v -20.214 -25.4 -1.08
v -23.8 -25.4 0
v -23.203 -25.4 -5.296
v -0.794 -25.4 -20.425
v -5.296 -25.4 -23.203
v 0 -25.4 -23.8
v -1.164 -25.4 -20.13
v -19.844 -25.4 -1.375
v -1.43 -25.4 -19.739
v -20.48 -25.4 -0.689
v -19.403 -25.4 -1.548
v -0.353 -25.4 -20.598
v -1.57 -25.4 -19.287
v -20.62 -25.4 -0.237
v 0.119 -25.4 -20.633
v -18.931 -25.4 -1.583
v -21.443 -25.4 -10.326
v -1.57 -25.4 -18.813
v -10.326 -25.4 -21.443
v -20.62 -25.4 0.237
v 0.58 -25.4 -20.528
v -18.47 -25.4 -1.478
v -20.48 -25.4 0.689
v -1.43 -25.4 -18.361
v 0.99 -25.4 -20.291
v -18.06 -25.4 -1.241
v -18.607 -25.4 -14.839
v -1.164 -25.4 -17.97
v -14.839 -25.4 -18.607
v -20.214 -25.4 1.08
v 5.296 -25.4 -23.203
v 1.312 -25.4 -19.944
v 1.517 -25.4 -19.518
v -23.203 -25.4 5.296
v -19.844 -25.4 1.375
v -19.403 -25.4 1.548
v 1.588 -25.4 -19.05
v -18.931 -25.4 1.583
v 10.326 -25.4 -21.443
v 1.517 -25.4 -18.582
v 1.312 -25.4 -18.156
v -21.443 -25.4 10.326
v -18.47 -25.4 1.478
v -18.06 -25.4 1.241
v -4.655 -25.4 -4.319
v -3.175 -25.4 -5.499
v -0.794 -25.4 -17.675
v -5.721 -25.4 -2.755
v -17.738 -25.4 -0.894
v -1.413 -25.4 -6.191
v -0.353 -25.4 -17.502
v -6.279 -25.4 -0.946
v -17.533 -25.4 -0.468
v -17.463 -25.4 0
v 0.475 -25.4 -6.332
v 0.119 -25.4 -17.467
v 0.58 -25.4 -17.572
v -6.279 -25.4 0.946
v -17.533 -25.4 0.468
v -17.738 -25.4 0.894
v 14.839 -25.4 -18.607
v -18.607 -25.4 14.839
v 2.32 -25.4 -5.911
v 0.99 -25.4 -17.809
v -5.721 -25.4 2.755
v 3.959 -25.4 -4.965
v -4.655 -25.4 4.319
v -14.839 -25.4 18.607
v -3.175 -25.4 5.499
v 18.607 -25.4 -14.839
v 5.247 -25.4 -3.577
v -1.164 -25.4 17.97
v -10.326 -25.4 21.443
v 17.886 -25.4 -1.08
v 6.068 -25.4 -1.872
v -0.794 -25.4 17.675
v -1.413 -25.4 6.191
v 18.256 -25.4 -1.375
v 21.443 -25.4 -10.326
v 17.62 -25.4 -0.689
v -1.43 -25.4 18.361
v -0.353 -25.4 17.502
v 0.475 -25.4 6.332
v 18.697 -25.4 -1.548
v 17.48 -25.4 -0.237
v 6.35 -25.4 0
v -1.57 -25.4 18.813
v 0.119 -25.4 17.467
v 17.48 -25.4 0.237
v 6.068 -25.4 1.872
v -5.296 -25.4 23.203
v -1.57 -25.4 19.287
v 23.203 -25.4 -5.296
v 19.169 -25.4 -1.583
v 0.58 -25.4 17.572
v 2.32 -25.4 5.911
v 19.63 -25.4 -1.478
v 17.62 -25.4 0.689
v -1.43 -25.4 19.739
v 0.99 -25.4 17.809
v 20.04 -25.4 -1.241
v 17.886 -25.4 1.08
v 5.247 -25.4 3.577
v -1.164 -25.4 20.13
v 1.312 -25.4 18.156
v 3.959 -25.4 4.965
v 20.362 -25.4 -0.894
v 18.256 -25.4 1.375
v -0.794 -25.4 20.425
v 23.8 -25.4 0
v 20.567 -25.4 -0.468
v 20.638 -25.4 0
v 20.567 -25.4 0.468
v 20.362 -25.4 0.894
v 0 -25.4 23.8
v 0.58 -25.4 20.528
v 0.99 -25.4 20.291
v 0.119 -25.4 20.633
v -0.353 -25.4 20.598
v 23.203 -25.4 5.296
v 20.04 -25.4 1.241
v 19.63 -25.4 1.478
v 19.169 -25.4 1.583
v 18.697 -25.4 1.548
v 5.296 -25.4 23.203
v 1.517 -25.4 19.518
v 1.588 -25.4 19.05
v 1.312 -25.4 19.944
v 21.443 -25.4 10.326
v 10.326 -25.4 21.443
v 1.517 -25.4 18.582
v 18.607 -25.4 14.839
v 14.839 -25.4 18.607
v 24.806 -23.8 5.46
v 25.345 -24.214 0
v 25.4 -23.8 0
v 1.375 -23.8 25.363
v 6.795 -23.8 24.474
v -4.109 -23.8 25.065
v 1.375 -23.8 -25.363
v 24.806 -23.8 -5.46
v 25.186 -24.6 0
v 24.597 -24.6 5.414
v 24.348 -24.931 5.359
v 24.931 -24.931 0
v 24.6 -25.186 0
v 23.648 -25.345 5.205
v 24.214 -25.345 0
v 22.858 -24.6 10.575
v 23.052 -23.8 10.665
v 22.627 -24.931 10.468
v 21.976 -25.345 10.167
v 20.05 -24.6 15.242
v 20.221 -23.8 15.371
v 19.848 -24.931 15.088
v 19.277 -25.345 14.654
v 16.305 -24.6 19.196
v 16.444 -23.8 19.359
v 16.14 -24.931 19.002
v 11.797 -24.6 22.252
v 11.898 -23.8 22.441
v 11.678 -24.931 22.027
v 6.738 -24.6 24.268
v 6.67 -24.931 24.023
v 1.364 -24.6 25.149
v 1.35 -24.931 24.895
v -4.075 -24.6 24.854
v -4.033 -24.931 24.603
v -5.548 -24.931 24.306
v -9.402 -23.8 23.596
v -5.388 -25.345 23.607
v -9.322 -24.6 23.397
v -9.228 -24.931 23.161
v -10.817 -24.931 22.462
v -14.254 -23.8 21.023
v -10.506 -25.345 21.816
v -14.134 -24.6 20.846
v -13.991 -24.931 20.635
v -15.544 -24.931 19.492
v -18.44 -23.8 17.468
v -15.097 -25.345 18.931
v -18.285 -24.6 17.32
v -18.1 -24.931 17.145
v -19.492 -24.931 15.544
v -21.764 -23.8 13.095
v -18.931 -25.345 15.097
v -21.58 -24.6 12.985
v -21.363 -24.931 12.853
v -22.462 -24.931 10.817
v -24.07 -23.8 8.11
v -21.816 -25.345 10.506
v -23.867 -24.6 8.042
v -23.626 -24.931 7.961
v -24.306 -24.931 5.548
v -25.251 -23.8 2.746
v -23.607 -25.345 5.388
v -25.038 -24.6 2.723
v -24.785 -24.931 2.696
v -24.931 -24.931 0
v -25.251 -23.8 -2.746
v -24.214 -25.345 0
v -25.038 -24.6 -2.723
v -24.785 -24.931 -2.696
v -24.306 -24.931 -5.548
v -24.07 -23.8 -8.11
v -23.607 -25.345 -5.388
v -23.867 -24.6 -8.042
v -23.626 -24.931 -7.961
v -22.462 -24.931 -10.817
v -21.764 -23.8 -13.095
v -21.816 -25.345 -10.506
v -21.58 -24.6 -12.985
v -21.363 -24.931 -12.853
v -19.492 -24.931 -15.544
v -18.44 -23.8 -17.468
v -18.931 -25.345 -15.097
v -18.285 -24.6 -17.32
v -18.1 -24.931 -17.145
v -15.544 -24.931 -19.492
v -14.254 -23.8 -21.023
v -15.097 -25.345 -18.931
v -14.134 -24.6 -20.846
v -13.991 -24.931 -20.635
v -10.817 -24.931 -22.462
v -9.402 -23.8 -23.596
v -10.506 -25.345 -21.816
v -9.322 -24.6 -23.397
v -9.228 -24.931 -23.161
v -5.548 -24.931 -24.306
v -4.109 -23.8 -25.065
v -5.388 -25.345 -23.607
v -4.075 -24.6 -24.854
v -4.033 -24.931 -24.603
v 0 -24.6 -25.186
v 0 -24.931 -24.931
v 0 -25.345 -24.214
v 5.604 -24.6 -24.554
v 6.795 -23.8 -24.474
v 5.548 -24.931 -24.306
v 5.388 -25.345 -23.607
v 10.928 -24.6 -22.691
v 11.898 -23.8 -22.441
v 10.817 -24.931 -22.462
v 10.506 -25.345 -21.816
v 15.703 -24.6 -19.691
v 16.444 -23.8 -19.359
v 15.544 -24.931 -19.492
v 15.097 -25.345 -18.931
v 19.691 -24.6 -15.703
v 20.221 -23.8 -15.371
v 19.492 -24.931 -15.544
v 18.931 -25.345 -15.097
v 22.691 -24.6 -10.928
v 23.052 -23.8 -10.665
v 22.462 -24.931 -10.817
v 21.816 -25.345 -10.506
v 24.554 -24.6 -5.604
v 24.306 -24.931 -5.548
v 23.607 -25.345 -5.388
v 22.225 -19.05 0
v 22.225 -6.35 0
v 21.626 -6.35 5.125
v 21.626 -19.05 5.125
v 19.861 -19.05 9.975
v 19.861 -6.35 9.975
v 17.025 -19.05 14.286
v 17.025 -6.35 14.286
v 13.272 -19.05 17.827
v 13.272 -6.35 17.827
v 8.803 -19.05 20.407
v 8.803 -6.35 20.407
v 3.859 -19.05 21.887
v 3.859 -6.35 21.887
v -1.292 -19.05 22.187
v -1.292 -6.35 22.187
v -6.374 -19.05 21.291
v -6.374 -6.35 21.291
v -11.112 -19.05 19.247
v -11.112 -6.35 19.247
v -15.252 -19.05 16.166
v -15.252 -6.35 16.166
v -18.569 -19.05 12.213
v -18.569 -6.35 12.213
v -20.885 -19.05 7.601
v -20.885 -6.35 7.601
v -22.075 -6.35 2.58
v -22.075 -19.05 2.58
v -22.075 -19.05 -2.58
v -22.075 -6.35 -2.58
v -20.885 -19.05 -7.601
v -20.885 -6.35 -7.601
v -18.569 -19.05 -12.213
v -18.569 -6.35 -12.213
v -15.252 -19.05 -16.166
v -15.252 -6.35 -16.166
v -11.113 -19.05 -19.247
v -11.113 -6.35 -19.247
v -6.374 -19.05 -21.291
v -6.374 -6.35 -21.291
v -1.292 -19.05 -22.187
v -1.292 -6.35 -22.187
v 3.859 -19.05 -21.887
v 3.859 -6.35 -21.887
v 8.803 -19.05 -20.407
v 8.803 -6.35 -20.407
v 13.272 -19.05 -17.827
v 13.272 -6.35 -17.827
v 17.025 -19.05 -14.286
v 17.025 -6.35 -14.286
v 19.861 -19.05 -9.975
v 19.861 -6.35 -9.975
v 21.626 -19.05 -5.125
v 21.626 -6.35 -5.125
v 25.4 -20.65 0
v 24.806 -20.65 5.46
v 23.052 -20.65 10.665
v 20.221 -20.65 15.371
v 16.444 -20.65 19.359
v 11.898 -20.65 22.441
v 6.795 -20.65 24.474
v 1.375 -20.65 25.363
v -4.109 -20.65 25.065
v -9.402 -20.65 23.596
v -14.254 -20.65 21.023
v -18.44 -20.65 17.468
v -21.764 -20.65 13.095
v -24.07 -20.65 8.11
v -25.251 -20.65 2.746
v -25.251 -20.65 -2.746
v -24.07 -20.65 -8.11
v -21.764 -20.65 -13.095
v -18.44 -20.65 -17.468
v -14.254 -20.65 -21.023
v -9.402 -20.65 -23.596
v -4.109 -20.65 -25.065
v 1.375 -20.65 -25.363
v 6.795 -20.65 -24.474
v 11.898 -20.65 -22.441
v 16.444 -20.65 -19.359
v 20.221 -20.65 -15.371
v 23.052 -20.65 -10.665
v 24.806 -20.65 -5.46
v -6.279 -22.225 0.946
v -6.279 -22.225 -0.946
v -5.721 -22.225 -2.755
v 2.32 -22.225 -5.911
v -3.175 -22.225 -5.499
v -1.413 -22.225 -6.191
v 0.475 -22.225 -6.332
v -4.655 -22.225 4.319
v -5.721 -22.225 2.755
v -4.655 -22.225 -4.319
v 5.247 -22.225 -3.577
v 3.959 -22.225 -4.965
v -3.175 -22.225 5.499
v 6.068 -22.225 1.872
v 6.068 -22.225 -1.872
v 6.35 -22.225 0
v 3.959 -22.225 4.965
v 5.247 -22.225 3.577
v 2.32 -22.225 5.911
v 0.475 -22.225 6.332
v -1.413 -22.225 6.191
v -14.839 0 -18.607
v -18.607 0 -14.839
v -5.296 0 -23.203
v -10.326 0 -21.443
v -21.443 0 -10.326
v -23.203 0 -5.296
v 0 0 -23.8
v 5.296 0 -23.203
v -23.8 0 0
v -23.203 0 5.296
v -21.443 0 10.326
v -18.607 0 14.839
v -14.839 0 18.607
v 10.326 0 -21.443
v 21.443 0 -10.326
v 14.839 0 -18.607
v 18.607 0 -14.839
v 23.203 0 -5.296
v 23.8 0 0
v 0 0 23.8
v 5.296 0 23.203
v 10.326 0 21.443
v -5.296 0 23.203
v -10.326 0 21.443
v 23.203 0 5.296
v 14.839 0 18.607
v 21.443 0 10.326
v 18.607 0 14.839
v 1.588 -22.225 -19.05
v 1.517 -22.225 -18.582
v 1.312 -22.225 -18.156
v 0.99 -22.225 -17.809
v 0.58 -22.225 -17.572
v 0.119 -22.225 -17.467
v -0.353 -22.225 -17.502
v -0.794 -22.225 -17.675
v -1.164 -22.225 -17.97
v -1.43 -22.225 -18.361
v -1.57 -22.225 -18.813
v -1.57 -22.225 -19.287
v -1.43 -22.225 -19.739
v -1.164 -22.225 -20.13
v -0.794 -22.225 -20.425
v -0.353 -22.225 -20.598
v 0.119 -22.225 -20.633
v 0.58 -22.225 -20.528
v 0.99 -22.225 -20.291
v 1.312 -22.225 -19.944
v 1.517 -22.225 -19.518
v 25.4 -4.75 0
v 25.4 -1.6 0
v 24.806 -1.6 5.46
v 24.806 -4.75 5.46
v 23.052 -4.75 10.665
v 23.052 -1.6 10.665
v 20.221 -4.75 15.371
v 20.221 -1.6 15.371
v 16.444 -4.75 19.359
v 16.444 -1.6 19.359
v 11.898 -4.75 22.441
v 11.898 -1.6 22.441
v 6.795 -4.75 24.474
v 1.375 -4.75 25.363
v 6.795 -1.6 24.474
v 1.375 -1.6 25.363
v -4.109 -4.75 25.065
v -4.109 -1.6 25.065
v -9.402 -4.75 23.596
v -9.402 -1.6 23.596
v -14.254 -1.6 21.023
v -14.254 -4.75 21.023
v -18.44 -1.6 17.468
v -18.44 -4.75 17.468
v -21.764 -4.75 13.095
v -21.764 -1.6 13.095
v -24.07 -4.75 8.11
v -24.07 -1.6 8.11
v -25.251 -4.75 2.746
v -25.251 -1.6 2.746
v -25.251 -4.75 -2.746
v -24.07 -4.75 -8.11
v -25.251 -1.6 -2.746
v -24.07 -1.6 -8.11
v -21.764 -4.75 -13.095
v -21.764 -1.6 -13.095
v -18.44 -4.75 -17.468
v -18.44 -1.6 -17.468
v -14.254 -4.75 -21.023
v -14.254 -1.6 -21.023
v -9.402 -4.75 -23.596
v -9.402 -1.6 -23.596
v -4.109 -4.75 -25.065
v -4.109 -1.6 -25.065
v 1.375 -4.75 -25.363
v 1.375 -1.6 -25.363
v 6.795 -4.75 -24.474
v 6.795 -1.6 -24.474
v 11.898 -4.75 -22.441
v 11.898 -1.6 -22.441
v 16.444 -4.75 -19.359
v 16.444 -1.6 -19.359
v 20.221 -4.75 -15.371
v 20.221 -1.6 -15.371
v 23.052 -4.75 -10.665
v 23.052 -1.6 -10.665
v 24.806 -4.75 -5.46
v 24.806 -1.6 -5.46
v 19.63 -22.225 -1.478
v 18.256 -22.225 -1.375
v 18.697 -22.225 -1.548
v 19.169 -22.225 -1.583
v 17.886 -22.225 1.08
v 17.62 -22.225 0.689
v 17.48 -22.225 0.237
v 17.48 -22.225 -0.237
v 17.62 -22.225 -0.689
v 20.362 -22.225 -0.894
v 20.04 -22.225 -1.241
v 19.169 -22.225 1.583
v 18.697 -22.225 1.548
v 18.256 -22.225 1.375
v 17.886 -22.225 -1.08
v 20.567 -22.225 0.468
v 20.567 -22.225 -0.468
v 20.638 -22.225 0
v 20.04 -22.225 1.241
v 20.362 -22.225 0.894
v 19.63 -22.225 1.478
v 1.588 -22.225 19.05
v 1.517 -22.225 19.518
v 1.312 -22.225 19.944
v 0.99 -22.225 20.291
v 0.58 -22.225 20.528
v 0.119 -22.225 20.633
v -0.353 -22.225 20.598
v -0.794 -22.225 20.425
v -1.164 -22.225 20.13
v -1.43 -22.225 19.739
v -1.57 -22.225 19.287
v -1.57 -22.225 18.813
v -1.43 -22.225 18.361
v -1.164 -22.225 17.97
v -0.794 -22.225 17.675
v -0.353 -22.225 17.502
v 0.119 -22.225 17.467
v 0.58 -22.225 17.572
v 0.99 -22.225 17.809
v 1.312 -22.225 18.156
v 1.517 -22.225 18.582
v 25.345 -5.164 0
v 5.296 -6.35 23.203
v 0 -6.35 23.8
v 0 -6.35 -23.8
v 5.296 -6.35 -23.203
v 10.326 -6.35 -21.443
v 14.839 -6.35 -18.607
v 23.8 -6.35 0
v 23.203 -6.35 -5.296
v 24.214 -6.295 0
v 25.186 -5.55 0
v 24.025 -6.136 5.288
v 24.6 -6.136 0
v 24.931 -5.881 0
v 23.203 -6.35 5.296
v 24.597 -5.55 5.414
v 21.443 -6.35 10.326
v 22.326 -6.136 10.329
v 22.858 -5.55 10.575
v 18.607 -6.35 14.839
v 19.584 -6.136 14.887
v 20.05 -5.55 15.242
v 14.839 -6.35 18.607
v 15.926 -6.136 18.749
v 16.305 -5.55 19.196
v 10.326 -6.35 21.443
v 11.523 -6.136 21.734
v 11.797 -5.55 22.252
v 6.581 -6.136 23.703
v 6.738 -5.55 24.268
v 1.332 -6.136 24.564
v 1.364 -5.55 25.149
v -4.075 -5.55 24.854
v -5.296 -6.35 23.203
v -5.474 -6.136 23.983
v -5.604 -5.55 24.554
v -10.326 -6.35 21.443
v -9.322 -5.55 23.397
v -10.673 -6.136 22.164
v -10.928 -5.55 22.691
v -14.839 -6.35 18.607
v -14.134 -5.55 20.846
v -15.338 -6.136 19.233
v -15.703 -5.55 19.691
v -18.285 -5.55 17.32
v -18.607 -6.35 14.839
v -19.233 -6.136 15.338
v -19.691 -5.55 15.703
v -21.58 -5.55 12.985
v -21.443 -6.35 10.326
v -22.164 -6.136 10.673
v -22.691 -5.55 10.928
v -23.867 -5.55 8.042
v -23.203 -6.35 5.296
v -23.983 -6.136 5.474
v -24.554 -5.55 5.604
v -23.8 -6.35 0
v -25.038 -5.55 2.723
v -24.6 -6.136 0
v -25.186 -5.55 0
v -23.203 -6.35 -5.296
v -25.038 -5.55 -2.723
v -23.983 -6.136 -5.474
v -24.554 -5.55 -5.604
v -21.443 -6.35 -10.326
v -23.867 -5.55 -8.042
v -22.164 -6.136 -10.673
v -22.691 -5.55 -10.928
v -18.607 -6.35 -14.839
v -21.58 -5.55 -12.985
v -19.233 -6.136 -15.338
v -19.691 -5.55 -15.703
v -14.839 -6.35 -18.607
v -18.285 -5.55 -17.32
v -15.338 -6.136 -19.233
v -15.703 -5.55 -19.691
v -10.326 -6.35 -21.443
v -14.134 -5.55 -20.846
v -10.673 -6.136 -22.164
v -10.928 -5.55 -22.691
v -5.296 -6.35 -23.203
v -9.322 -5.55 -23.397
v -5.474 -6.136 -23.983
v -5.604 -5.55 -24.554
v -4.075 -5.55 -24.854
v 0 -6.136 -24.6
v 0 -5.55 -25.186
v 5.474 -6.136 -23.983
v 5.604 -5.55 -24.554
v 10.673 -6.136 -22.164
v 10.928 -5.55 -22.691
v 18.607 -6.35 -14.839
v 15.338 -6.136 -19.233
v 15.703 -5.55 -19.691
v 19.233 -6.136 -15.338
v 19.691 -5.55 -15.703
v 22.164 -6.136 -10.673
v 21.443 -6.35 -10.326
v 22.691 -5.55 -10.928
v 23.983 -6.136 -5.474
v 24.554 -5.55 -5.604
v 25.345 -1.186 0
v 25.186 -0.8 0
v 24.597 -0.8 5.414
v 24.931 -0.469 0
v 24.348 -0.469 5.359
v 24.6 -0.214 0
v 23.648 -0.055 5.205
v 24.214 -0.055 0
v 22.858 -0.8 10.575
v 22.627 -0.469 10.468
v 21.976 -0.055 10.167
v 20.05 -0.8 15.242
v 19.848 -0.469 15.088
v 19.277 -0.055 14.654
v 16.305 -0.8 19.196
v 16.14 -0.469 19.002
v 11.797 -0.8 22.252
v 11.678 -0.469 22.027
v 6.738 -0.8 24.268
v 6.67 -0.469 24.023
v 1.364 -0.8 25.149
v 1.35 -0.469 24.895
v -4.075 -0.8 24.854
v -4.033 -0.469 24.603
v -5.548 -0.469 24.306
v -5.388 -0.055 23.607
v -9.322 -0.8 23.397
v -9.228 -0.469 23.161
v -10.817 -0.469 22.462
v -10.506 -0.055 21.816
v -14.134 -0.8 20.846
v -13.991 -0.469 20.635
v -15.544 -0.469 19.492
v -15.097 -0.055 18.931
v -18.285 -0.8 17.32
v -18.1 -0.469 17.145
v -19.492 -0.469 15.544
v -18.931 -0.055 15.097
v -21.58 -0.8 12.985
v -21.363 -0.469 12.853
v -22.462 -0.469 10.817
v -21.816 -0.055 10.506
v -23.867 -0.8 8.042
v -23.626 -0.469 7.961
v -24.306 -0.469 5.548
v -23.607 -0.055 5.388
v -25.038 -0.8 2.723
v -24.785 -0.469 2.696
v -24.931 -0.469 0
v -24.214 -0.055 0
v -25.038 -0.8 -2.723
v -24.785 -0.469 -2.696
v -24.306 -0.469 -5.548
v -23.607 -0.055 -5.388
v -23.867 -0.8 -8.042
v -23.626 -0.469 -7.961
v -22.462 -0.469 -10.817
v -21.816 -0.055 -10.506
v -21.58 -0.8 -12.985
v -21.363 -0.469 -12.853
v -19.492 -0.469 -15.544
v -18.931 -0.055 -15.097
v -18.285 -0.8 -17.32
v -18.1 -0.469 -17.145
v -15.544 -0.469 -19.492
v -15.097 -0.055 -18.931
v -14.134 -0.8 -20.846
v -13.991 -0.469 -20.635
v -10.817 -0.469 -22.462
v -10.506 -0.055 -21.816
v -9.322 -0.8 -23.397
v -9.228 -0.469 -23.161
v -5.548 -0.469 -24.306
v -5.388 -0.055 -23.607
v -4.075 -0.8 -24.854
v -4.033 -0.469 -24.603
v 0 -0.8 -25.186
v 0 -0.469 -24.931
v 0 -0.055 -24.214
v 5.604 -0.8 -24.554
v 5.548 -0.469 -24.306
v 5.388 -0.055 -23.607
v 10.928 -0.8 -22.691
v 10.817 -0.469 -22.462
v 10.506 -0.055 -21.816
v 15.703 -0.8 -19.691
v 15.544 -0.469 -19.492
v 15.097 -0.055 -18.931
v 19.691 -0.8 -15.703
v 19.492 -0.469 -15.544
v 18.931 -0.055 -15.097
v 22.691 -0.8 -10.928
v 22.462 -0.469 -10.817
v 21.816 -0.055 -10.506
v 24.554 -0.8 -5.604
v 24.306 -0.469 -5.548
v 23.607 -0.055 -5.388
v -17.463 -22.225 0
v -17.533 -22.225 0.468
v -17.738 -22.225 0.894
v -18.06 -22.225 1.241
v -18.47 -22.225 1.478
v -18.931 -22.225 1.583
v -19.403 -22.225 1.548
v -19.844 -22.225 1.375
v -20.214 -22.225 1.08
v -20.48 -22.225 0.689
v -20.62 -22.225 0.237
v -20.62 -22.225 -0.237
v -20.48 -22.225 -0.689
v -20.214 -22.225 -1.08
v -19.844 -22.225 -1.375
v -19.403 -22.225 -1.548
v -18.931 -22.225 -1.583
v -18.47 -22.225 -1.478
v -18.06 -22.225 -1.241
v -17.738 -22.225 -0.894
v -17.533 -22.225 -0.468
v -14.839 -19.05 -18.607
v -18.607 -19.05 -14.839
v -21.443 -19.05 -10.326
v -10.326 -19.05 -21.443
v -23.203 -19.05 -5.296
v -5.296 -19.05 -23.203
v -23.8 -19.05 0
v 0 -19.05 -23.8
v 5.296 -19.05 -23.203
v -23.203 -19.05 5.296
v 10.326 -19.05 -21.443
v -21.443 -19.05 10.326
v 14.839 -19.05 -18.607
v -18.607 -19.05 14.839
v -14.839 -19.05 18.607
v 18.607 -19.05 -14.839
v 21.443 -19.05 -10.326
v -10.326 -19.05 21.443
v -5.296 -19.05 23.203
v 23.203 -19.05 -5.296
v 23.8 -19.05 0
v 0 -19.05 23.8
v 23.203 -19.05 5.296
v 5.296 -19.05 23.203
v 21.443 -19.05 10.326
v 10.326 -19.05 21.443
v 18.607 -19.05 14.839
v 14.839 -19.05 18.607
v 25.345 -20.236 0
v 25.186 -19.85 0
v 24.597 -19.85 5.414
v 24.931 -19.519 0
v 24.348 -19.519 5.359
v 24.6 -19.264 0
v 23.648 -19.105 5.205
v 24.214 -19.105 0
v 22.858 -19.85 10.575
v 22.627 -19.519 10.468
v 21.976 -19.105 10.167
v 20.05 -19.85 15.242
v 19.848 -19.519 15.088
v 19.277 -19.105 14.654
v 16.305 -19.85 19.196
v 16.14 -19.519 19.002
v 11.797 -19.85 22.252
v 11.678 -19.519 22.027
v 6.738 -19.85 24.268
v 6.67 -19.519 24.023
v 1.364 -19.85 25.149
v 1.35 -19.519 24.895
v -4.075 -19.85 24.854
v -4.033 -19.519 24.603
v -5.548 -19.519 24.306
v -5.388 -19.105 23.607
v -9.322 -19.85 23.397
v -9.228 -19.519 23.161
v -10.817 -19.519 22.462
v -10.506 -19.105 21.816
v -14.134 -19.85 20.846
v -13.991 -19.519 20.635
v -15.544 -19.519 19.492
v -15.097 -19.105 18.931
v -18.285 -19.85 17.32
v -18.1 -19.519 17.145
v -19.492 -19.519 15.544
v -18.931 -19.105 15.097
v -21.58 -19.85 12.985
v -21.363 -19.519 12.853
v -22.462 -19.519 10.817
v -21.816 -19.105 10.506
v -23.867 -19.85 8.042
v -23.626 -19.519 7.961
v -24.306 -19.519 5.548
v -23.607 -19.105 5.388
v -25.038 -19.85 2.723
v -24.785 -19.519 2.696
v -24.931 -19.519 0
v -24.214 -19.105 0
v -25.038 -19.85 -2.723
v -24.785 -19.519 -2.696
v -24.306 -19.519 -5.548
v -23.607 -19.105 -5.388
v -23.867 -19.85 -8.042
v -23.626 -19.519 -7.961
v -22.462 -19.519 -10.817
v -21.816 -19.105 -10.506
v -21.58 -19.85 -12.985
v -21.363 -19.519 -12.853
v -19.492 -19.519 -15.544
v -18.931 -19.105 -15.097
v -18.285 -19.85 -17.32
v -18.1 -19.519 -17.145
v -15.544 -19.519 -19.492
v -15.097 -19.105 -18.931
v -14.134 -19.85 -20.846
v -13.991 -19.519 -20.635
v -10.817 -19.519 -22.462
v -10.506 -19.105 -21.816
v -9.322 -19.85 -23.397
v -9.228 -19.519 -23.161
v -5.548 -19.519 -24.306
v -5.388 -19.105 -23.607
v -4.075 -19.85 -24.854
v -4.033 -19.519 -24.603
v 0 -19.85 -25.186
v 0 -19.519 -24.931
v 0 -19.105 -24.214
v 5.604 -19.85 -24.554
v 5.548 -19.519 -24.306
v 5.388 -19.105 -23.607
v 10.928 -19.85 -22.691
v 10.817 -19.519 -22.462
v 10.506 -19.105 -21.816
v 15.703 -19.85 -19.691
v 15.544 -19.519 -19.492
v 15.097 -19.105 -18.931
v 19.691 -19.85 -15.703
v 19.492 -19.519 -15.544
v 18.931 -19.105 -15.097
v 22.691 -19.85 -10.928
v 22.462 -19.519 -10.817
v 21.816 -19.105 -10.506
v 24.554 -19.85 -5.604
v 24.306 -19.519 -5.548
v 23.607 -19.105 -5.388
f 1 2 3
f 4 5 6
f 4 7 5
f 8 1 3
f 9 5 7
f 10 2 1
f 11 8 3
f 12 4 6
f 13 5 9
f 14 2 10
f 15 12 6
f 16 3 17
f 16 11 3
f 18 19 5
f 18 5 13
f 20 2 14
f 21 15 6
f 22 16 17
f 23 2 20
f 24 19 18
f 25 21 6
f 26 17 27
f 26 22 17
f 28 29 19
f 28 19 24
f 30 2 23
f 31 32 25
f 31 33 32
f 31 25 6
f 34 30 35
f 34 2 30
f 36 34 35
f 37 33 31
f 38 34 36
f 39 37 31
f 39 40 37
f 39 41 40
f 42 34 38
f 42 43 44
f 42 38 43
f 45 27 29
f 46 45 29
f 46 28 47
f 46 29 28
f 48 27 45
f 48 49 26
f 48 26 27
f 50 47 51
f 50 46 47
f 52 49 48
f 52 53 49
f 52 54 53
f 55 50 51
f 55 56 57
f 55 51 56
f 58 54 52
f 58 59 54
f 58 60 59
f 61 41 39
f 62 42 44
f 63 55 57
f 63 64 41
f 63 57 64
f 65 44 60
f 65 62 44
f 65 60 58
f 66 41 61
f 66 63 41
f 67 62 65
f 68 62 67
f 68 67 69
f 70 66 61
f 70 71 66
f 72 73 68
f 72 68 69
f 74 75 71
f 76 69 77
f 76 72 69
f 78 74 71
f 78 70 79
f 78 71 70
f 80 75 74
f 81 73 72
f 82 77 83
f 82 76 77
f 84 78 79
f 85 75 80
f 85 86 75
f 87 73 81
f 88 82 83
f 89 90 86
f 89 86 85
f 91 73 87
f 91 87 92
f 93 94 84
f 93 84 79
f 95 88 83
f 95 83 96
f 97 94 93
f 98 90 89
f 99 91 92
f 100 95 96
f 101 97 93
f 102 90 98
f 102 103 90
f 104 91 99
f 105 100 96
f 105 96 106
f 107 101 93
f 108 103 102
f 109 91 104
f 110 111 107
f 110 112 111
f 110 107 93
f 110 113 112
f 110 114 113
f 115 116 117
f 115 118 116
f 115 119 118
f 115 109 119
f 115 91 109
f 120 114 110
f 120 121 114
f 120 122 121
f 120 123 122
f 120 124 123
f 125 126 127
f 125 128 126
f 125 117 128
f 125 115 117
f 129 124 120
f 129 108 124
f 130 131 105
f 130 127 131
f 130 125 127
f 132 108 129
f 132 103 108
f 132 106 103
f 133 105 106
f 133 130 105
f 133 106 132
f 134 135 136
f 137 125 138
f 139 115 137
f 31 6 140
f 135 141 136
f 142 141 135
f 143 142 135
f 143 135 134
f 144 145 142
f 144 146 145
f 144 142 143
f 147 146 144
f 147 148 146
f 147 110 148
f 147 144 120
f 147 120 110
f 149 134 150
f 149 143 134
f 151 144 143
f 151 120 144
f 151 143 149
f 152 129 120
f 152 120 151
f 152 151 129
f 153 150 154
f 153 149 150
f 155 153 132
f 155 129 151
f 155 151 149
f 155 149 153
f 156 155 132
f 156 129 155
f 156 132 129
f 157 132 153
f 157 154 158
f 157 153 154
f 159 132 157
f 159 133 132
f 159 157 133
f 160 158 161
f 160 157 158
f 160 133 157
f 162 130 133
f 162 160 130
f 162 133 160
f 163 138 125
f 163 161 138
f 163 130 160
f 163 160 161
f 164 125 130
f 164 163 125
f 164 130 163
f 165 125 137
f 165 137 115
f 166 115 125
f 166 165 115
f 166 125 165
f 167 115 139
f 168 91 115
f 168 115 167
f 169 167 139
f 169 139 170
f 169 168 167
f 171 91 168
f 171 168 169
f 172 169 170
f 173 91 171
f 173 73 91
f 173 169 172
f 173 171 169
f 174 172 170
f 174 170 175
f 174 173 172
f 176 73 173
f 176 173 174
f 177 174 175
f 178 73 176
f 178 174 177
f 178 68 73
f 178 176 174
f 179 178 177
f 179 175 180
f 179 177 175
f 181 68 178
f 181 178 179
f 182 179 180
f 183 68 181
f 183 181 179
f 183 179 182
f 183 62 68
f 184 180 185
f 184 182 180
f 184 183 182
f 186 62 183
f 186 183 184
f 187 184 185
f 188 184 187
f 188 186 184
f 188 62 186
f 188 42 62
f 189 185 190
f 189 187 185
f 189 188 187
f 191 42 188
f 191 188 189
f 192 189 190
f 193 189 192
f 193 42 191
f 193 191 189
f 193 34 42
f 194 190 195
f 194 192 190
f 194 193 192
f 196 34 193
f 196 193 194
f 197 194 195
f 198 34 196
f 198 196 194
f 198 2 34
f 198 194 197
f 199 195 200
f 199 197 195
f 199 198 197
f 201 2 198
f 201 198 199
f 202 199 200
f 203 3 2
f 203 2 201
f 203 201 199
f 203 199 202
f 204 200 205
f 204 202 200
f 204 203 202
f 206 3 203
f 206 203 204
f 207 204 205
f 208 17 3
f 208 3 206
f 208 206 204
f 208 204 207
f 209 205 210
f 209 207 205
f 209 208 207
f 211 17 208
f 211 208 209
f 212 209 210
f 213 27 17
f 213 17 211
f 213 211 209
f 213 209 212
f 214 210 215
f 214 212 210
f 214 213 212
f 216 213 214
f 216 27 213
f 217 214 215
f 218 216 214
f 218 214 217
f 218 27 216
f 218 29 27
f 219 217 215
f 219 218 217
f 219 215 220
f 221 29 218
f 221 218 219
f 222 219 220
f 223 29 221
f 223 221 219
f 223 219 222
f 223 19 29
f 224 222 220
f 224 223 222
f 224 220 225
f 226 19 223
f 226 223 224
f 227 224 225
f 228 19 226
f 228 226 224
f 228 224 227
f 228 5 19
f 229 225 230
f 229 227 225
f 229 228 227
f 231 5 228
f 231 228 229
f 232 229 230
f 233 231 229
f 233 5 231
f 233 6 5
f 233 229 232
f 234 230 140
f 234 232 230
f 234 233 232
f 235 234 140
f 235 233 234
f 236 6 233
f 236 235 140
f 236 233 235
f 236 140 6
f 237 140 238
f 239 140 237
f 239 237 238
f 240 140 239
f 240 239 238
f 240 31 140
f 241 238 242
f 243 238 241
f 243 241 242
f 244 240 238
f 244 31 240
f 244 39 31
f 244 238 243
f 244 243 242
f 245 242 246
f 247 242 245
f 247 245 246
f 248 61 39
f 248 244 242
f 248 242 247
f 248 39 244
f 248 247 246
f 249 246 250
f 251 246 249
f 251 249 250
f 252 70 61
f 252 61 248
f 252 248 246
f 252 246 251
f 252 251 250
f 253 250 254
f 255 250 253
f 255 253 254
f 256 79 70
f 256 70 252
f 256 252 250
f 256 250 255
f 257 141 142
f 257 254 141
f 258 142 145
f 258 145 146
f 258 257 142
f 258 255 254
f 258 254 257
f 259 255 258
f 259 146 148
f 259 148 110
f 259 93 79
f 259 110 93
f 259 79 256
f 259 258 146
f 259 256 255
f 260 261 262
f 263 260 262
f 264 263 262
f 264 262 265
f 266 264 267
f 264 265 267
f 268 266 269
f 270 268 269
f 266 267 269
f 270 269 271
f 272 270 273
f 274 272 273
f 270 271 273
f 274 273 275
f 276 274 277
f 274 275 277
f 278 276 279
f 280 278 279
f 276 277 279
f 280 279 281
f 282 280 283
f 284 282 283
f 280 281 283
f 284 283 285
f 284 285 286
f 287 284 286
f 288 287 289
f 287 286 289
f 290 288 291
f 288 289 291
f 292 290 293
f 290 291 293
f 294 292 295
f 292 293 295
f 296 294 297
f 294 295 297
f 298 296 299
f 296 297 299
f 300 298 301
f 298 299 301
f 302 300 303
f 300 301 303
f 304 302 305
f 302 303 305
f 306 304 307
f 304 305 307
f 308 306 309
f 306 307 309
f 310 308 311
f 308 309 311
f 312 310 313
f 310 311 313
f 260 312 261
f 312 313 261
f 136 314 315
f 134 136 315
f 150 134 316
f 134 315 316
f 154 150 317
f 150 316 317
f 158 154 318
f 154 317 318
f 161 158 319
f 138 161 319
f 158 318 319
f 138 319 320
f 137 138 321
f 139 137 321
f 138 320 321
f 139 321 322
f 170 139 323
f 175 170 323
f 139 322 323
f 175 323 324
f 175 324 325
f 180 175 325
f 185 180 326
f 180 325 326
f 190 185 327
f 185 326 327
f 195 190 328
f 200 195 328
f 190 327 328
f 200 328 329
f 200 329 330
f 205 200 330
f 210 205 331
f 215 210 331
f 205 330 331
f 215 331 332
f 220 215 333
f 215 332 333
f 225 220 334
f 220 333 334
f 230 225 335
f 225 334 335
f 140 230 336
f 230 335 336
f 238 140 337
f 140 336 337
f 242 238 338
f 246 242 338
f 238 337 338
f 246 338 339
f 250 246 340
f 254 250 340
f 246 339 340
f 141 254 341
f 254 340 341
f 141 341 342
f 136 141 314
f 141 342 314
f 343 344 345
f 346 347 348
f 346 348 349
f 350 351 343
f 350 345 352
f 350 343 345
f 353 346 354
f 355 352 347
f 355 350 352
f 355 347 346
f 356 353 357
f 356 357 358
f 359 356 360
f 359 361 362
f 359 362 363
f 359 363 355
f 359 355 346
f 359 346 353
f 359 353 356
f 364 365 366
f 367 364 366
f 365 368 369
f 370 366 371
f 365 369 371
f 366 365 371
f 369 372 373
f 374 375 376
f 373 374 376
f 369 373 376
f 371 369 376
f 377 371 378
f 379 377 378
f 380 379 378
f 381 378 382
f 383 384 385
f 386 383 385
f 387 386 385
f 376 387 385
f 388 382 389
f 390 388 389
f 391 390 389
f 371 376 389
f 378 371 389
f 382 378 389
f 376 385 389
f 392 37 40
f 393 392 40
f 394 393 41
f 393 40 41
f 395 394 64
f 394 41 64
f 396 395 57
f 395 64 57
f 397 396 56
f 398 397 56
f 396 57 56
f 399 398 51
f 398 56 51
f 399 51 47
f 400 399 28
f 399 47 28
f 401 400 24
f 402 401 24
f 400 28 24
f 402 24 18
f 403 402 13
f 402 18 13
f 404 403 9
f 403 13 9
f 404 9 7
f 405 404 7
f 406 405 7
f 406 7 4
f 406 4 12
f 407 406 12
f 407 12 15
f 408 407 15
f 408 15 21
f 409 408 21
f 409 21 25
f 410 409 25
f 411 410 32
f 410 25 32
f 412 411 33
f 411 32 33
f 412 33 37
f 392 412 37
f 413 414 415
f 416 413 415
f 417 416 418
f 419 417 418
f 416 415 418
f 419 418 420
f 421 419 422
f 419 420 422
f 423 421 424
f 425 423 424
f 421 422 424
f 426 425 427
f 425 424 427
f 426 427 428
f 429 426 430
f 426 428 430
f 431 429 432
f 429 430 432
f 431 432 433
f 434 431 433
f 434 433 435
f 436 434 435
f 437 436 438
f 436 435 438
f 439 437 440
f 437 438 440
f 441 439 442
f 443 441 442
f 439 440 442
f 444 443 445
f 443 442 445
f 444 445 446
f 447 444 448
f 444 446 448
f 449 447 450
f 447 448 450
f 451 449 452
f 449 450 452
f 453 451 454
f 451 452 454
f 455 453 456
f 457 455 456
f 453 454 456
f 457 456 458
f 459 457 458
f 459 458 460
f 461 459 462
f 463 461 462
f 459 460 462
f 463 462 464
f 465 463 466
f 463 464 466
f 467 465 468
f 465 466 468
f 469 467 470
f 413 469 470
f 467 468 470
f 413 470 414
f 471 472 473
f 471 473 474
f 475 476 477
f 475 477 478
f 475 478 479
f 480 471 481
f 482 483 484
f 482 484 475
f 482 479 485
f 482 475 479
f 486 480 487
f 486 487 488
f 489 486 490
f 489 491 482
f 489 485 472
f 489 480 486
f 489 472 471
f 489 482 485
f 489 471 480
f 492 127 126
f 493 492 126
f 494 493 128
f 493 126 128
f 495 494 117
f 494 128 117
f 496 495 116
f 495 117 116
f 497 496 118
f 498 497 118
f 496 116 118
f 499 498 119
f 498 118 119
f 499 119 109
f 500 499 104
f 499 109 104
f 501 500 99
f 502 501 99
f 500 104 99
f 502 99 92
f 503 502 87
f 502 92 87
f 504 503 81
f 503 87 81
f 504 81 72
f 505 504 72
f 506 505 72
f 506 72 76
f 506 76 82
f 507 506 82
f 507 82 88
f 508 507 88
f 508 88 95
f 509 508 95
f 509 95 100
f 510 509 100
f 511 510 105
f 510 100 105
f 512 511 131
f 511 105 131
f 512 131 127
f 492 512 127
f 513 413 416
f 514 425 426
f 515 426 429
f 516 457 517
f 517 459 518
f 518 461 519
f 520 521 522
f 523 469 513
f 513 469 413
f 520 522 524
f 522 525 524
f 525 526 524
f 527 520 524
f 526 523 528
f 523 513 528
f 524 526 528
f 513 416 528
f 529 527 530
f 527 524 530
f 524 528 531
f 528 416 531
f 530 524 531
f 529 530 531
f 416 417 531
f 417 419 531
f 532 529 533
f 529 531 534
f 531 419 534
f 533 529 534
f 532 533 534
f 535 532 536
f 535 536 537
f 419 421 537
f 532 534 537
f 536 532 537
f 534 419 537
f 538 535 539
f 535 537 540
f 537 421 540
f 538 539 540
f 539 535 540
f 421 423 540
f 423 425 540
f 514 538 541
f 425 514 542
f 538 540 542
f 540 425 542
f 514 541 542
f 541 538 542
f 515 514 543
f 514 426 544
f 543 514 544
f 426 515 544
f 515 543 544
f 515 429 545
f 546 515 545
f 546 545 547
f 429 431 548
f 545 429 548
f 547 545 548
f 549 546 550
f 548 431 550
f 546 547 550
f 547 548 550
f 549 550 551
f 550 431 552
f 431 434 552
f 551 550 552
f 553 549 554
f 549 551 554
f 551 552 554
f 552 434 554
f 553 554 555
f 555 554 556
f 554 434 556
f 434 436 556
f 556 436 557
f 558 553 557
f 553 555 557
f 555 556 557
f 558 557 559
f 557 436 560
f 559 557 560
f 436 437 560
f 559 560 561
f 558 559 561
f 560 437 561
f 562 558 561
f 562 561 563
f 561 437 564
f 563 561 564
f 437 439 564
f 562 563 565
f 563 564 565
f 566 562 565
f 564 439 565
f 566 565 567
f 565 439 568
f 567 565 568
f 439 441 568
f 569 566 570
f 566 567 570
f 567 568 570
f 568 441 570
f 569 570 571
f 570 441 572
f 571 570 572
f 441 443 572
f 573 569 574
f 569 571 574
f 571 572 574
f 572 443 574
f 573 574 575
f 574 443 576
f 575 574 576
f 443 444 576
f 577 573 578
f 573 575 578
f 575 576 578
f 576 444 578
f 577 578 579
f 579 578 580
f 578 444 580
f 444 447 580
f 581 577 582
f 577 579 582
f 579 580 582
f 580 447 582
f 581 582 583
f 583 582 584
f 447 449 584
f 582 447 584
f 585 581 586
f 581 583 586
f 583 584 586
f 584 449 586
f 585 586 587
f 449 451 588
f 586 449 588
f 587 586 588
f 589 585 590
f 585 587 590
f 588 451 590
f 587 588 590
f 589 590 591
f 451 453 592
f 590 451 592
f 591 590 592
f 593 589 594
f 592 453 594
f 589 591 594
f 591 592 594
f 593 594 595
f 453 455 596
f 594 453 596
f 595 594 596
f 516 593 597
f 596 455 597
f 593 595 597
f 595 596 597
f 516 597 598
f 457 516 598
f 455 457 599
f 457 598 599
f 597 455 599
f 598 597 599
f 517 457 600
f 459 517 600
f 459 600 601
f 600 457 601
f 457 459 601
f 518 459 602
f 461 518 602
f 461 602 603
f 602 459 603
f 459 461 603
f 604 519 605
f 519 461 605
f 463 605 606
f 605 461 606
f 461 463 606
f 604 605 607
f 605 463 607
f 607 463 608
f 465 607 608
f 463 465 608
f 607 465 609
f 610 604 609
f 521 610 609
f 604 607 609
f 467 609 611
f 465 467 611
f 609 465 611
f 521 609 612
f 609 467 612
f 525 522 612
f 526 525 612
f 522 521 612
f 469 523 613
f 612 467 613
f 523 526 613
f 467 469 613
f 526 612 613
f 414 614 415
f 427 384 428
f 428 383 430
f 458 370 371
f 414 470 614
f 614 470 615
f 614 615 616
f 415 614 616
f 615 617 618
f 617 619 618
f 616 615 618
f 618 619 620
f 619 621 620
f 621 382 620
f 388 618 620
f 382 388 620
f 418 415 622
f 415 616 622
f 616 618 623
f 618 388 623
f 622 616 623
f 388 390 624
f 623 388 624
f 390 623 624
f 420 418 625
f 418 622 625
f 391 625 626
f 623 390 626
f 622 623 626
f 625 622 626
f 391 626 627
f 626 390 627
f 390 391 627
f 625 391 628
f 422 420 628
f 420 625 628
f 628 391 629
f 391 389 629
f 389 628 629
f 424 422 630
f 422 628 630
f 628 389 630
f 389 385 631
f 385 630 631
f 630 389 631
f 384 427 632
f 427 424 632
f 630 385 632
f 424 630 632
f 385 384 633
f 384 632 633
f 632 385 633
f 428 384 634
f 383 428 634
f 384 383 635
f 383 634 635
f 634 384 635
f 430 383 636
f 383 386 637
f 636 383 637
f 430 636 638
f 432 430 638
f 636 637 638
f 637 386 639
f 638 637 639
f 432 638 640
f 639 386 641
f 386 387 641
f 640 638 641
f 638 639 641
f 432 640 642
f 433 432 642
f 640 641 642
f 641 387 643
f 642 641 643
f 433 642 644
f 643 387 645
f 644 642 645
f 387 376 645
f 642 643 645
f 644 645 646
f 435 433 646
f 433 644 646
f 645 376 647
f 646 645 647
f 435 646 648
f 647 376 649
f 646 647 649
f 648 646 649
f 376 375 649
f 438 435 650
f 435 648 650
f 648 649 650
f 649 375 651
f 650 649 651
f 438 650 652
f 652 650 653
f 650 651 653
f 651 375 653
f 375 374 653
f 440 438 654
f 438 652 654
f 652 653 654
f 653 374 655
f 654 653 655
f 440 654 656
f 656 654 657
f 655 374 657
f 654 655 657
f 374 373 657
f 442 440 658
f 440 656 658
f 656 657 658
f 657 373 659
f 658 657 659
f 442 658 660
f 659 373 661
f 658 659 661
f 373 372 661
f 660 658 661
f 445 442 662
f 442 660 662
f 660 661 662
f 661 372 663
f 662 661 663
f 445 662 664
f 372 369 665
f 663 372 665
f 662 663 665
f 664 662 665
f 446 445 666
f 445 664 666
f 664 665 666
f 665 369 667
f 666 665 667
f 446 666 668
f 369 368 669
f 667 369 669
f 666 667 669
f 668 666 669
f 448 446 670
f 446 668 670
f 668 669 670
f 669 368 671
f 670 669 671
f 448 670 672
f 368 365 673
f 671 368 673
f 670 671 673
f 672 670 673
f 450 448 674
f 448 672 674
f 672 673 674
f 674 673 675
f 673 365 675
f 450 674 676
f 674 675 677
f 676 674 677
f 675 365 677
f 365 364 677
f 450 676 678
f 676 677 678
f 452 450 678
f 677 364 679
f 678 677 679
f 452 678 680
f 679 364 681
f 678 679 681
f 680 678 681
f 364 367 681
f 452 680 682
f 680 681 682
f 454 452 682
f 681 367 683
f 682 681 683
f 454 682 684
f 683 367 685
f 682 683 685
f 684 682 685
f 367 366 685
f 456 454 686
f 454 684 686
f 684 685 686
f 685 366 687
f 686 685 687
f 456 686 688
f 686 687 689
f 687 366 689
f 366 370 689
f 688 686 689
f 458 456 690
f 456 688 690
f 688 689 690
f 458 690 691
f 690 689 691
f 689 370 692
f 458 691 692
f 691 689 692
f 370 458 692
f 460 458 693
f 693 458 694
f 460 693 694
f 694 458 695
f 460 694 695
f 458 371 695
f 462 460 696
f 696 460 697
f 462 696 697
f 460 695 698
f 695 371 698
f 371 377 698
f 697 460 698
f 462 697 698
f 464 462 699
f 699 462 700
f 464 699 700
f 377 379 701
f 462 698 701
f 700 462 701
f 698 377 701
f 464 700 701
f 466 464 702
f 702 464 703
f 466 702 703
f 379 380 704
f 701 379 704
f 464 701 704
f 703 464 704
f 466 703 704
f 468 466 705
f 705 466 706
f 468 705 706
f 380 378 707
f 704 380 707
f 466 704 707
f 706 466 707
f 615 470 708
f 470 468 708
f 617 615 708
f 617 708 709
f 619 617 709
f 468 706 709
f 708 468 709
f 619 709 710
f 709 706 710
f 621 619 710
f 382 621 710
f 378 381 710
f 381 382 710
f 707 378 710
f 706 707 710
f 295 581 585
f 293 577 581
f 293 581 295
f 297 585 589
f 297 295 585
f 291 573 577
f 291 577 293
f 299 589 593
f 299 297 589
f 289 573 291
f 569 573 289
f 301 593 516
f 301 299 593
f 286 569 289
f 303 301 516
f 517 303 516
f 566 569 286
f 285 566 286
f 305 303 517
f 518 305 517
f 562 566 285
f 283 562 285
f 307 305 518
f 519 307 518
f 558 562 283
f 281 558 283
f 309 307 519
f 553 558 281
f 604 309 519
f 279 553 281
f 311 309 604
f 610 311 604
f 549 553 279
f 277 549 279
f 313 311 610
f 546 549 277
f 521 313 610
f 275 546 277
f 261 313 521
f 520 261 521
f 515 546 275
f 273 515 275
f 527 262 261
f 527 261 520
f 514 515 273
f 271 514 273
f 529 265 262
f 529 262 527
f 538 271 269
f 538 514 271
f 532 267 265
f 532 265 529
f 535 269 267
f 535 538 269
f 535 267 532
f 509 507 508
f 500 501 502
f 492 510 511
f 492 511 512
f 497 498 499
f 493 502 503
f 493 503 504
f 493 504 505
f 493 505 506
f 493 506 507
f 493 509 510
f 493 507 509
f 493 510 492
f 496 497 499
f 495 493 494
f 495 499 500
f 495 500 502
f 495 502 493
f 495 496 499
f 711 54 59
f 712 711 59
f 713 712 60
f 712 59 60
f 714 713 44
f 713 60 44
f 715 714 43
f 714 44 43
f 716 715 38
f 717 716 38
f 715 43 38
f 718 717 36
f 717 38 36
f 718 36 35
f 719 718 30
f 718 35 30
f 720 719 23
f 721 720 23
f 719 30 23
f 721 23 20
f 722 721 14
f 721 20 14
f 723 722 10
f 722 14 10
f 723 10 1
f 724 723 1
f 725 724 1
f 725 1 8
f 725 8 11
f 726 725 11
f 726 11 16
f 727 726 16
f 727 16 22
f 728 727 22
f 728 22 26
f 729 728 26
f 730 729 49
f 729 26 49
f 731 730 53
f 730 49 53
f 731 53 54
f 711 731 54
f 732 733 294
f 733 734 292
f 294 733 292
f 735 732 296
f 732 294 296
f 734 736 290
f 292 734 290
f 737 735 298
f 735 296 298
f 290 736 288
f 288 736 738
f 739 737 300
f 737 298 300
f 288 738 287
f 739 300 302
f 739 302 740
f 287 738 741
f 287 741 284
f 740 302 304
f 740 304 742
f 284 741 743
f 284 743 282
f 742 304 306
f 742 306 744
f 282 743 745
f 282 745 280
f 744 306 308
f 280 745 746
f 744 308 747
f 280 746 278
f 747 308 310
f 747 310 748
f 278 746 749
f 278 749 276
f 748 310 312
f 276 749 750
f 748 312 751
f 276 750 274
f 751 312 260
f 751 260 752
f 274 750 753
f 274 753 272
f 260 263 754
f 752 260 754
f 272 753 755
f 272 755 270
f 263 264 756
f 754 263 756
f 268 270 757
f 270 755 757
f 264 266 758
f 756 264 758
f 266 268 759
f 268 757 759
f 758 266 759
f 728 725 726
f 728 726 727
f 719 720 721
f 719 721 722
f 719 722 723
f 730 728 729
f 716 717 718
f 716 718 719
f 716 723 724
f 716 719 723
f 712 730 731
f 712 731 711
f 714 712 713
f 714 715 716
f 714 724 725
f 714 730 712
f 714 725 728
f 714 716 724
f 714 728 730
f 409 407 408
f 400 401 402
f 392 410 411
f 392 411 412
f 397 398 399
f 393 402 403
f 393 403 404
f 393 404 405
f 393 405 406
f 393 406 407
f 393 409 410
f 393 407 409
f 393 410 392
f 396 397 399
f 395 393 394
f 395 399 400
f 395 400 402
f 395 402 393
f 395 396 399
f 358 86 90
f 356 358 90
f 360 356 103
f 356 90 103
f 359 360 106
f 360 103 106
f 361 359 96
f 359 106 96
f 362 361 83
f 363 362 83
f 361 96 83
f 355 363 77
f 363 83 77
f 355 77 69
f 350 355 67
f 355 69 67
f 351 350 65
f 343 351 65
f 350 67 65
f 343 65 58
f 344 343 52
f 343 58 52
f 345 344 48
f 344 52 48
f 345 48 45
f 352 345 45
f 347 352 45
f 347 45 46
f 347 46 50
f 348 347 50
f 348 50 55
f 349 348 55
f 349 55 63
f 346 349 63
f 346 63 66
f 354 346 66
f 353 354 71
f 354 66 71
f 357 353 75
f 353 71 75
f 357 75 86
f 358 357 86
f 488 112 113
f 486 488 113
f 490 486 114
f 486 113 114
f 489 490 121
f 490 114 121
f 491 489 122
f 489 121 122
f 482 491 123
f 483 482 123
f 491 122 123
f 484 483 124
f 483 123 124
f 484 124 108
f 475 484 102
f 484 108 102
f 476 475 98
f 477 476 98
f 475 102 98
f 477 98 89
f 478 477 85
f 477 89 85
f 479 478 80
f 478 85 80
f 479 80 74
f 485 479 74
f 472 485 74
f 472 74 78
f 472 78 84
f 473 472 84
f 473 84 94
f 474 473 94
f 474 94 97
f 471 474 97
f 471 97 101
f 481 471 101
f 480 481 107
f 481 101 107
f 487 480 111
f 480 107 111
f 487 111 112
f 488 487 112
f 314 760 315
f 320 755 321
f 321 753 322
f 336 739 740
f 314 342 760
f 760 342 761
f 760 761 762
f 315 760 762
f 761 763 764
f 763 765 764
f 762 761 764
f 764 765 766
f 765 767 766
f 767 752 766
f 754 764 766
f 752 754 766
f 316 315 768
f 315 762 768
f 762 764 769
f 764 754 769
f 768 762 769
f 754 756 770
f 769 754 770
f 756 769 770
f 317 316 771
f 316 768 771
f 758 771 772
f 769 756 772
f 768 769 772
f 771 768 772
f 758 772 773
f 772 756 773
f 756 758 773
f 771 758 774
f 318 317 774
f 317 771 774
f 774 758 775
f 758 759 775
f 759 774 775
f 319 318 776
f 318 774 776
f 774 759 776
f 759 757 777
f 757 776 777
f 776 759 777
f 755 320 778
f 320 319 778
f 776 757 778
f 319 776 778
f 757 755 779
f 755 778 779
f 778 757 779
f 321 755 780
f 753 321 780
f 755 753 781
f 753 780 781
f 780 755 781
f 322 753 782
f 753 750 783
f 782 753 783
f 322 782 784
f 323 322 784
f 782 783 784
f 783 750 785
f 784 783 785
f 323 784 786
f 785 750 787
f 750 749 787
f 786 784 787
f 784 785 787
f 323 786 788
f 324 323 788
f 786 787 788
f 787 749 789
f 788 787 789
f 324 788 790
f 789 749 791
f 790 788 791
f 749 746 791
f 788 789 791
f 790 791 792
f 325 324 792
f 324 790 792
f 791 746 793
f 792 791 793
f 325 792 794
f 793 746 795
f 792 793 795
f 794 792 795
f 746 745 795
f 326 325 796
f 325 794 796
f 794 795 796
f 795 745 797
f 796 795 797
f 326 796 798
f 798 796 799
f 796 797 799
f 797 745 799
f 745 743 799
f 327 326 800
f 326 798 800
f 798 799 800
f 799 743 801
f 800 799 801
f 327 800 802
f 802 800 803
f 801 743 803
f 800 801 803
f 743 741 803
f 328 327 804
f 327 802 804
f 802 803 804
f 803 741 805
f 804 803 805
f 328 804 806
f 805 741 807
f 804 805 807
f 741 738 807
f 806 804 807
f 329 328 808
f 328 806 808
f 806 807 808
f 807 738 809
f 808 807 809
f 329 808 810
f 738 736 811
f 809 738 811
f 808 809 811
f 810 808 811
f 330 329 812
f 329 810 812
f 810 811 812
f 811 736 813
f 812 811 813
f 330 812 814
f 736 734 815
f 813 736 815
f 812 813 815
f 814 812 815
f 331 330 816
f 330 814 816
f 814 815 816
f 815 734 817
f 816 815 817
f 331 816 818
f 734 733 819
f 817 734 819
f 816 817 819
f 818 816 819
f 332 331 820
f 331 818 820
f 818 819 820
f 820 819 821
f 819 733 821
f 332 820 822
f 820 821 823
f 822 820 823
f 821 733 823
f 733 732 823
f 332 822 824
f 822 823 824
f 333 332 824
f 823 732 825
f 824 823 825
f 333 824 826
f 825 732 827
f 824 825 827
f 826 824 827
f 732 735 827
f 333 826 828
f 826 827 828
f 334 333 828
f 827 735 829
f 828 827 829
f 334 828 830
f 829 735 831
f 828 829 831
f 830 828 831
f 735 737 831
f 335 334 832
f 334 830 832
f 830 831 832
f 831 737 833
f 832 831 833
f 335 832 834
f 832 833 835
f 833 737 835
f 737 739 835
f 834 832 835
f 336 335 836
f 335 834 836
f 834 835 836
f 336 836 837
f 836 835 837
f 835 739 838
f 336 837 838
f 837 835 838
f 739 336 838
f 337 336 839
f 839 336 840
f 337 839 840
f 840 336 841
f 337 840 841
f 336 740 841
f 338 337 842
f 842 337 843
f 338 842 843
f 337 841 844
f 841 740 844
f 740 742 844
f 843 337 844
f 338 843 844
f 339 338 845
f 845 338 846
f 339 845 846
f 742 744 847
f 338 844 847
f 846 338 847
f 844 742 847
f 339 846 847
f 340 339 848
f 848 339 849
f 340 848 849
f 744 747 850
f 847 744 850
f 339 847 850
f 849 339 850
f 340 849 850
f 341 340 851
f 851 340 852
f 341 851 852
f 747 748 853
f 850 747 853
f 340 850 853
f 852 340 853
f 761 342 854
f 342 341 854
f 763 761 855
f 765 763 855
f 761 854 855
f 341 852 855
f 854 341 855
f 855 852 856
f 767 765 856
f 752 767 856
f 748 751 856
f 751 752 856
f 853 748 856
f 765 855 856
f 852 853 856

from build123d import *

# Parameters (mm, degrees)
F0_R     = 25.4
F1_DEPTH = 6.35
F2_R     = 22.225
F3_DEPTH = 12.7
F4_R     = 25.4
F5_DEPTH = 6.35
F6_R     = 1.6002
F7_R     = 6.35
F7_R_2   = 1.5875
F8_DEPTH = 3.175


with BuildPart() as f1:
    # F0 (on Front) → F1 (new body)
    with BuildSketch(Plane.XZ):
        Circle(F0_R)
    extrude(amount=F1_DEPTH)

    # F2 (on face) → F3 (join)
    with BuildSketch(Plane.XZ.offset(6.35)):
        Circle(F2_R)
    extrude(amount=F3_DEPTH)

    # F4 (on face) → F5 (join)
    with BuildSketch(Plane.XZ.offset(19.05)):
        Circle(F4_R)
    extrude(amount=F5_DEPTH)

    # F6
    f6_edges = [f1.edges().sort_by_distance(p)[0] for p in [
        (25.4, -3.175, 0),
        (-25.4, 0, 0),
        (-25.4, -6.35, 0),
        (25.4, -22.225, 0),
        (-25.4, -19.05, 0),
        (-25.4, -25.4, 0),
    ]]
    fillet(f6_edges, radius=F6_R)

    # F7 (on face) → F8 (cut)
    with BuildSketch(Plane.XZ.offset(25.4)):
        Circle(F7_R)
        with Locations((0, 19.05)):
            Circle(F7_R_2)
        with Locations((19.05, 0)):
            Circle(F7_R_2)
        with Locations((0, -19.05)):
            Circle(F7_R_2)
        with Locations((-19.05, 0)):
            Circle(F7_R_2)
    extrude(amount=-F8_DEPTH, mode=Mode.SUBTRACT)


solid = f1.part
